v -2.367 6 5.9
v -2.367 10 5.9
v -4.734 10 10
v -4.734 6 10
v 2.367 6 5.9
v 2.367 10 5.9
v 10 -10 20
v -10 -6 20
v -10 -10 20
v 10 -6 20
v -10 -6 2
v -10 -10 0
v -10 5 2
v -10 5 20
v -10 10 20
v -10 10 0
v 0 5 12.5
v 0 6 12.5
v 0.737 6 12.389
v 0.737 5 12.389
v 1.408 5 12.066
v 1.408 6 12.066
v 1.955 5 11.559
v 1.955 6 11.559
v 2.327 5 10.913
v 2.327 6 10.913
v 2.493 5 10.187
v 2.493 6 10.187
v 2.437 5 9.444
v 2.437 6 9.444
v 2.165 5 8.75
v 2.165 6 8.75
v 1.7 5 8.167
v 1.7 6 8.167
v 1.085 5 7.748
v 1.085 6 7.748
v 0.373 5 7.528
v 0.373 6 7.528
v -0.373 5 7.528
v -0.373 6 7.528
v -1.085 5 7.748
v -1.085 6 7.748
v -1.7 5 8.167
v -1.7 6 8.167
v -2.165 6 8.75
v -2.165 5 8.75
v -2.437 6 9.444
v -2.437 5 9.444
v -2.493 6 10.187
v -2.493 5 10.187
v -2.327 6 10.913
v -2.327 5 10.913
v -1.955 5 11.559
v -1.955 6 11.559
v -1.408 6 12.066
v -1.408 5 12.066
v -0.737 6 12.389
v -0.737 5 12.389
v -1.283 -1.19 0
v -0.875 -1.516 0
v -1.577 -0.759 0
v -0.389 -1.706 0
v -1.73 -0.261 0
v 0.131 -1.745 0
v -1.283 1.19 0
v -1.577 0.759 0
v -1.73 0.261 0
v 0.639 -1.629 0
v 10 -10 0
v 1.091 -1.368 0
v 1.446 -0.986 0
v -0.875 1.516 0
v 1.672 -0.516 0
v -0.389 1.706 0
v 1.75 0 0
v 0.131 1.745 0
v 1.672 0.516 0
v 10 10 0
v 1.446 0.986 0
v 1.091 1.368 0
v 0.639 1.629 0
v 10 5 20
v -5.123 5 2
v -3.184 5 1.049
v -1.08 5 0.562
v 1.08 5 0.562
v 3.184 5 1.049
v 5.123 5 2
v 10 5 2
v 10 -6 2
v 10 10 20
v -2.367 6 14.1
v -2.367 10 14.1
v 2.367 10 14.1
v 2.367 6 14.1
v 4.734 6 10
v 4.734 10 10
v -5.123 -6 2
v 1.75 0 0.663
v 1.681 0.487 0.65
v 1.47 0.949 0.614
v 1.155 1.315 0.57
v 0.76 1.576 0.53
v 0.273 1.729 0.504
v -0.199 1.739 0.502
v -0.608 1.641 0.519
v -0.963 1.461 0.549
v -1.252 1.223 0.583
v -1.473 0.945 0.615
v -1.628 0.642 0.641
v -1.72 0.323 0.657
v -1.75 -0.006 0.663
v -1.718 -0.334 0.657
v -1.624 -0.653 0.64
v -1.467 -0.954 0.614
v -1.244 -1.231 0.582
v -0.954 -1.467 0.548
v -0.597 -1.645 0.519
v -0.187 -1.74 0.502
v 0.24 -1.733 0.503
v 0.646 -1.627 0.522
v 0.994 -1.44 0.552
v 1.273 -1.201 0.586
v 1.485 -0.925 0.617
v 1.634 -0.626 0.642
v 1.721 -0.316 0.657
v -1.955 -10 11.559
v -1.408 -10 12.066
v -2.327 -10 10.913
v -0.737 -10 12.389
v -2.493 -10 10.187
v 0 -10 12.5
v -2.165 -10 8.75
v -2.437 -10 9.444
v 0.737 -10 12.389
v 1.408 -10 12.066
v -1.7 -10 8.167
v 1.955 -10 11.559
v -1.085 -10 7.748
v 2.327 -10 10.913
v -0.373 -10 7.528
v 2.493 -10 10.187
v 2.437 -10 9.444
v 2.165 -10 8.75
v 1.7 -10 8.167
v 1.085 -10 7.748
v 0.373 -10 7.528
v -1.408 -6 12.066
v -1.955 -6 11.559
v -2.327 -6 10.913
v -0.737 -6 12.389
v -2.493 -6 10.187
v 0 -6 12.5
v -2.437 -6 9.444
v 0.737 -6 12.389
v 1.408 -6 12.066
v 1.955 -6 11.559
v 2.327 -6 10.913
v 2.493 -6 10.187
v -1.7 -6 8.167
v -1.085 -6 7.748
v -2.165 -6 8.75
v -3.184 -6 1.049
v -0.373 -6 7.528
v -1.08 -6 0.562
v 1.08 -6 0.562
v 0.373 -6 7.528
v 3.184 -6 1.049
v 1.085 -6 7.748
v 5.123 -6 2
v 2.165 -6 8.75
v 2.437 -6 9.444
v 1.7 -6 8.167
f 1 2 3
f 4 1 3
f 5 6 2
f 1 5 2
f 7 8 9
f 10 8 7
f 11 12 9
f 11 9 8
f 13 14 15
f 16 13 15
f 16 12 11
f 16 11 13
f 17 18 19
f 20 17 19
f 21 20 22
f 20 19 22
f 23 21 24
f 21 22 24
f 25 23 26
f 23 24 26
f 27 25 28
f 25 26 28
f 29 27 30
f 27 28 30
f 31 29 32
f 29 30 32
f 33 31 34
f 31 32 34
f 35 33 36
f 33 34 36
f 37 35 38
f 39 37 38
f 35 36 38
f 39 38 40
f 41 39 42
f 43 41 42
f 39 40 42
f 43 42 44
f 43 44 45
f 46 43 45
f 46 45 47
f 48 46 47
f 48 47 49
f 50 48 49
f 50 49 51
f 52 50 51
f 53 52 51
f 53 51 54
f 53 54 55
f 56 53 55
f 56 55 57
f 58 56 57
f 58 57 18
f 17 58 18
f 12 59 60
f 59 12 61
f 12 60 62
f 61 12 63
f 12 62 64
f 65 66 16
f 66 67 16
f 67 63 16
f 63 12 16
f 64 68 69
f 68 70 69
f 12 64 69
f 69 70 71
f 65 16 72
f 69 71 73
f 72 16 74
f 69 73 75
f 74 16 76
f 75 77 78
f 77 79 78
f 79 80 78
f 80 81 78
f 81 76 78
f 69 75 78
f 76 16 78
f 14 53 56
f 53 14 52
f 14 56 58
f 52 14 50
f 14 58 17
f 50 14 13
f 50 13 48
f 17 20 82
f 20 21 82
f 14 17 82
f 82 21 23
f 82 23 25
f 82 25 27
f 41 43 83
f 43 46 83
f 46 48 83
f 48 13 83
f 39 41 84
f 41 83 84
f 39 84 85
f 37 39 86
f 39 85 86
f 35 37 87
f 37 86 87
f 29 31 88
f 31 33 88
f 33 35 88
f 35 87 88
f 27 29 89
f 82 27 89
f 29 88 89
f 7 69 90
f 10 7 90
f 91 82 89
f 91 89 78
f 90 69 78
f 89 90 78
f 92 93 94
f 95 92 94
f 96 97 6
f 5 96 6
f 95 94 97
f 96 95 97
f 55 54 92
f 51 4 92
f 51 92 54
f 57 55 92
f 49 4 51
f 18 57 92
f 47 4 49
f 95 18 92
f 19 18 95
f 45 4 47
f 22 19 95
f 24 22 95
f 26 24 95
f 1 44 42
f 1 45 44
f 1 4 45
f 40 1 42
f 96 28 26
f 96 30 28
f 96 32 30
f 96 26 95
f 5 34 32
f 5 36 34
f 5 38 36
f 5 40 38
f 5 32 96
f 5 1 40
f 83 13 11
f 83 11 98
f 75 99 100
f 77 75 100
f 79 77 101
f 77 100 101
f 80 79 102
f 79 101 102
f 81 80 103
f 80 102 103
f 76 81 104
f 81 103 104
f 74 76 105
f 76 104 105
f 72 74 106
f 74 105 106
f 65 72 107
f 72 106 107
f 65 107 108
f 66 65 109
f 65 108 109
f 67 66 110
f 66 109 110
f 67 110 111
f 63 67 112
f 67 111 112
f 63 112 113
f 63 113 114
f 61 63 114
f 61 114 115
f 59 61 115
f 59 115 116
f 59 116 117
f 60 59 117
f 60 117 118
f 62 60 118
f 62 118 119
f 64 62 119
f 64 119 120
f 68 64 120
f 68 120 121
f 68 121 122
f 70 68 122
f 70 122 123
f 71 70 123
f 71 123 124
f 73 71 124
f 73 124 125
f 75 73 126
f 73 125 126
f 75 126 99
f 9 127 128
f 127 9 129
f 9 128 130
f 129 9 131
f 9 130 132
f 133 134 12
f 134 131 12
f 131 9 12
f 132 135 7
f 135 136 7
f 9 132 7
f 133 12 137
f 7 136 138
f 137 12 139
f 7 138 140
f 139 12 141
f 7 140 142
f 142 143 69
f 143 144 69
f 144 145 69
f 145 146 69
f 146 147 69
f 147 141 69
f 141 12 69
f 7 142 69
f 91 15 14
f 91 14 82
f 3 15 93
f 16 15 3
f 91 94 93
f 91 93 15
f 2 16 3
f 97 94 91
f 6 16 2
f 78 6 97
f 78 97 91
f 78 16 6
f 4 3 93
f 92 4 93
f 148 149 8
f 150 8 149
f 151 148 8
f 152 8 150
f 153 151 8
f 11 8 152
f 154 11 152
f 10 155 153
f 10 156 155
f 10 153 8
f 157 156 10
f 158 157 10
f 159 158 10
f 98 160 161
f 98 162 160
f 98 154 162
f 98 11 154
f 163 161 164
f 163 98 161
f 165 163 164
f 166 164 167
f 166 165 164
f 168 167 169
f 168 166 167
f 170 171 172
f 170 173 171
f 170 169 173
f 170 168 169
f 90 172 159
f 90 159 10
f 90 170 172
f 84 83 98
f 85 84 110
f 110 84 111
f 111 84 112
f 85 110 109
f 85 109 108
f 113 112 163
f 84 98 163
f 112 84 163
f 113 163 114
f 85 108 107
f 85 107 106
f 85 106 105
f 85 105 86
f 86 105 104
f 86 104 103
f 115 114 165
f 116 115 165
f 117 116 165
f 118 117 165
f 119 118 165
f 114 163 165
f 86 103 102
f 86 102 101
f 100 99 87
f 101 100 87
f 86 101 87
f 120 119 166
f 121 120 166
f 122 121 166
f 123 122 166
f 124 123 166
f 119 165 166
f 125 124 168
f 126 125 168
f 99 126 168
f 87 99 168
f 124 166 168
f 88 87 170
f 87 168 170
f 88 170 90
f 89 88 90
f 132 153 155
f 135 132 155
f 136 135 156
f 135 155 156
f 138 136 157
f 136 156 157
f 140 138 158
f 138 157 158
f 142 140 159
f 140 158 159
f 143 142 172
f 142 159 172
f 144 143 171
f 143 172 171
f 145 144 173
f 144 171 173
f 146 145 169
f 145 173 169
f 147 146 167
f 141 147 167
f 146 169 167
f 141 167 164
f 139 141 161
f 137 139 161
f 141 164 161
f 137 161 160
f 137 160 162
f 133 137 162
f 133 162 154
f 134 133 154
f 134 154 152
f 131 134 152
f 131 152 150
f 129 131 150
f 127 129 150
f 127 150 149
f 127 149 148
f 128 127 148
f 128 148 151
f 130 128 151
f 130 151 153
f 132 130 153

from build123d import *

# Parameters (mm, degrees)
SZKIC1_W                    = 20
SZKIC1_H                    = 20
DODANIE_WYCI_GNI_CIE1_DEPTH = 2
SZKIC2_R                    = 1.75
WYTNIJ_WYCI_GNI_CIE1_DEPTH  = 15.282856857
SZKIC3_W                    = 20
SZKIC3_H                    = 5
SZKIC3_H_2                  = 4
DODANIE_WYCI_GNI_CIE2_DEPTH = 18
SZKIC4_R                    = 2.5
WYTNIJ_WYCI_GNI_CIE2_DEPTH  = 31
WYTNIJ_WYCI_GNI_CIE3_DEPTH  = 4
WYTNIJ_WYCI_GNI_CIE5_START  = -4
SZKIC7_R                    = 9.5
WYTNIJ_WYCI_GNI_CIE5_DEPTH  = 11


with BuildPart() as part:
    # Szkic1 → Dodanie-wyciągnięcie1 (new body)
    with BuildSketch(Plane.XY):
        Rectangle(SZKIC1_W, SZKIC1_H)
    extrude(amount=DODANIE_WYCI_GNI_CIE1_DEPTH)

    # Szkic2 → Wytnij-wyciągnięcie1 (cut, through all)
    with BuildSketch(Plane.XY.offset(2)):
        Circle(SZKIC2_R)
    extrude(amount=-WYTNIJ_WYCI_GNI_CIE1_DEPTH, mode=Mode.SUBTRACT)

    # Szkic3 → Dodanie-wyciągnięcie2 (add)
    with BuildSketch(Plane.XY.offset(2)):
        with Locations((0, 7.5)):
            Rectangle(SZKIC3_W, SZKIC3_H)
        with Locations((0, -8)):
            Rectangle(SZKIC3_W, SZKIC3_H_2)
    extrude(amount=DODANIE_WYCI_GNI_CIE2_DEPTH)

    # Szkic4 → Wytnij-wyciągnięcie2 (cut, through all)
    with BuildSketch(Plane(origin=(0, 10, 0), x_dir=(1, 0, 0), z_dir=(0, 1, 0))):
        with Locations(Location((0, -10, 0), (0, 0, 270))):
            Circle(SZKIC4_R)
    extrude(amount=-WYTNIJ_WYCI_GNI_CIE2_DEPTH, mode=Mode.SUBTRACT)

    # Szkic6 → Wytnij-wyciągnięcie3 (cut)
    with BuildSketch(Plane(origin=(0, 10, 0), x_dir=(1, 0, 0), z_dir=(0, 1, 0))):
        Polygon((4.734272207, -10), (2.367136104, -5.9), (-2.367136104, -5.9), (-4.734272207, -10), (-2.367136104, -14.1), (2.367136104, -14.1), align=None)
    extrude(amount=-WYTNIJ_WYCI_GNI_CIE3_DEPTH, mode=Mode.SUBTRACT)

    # Szkic7 → Wytnij-wyciągnięcie5 (cut)
    with BuildSketch(Plane.XZ.offset(10).offset(WYTNIJ_WYCI_GNI_CIE5_START)):
        with Locations((0, 10)):
            Circle(SZKIC7_R)
    extrude(amount=-WYTNIJ_WYCI_GNI_CIE5_DEPTH, mode=Mode.SUBTRACT)


solid = part.part
